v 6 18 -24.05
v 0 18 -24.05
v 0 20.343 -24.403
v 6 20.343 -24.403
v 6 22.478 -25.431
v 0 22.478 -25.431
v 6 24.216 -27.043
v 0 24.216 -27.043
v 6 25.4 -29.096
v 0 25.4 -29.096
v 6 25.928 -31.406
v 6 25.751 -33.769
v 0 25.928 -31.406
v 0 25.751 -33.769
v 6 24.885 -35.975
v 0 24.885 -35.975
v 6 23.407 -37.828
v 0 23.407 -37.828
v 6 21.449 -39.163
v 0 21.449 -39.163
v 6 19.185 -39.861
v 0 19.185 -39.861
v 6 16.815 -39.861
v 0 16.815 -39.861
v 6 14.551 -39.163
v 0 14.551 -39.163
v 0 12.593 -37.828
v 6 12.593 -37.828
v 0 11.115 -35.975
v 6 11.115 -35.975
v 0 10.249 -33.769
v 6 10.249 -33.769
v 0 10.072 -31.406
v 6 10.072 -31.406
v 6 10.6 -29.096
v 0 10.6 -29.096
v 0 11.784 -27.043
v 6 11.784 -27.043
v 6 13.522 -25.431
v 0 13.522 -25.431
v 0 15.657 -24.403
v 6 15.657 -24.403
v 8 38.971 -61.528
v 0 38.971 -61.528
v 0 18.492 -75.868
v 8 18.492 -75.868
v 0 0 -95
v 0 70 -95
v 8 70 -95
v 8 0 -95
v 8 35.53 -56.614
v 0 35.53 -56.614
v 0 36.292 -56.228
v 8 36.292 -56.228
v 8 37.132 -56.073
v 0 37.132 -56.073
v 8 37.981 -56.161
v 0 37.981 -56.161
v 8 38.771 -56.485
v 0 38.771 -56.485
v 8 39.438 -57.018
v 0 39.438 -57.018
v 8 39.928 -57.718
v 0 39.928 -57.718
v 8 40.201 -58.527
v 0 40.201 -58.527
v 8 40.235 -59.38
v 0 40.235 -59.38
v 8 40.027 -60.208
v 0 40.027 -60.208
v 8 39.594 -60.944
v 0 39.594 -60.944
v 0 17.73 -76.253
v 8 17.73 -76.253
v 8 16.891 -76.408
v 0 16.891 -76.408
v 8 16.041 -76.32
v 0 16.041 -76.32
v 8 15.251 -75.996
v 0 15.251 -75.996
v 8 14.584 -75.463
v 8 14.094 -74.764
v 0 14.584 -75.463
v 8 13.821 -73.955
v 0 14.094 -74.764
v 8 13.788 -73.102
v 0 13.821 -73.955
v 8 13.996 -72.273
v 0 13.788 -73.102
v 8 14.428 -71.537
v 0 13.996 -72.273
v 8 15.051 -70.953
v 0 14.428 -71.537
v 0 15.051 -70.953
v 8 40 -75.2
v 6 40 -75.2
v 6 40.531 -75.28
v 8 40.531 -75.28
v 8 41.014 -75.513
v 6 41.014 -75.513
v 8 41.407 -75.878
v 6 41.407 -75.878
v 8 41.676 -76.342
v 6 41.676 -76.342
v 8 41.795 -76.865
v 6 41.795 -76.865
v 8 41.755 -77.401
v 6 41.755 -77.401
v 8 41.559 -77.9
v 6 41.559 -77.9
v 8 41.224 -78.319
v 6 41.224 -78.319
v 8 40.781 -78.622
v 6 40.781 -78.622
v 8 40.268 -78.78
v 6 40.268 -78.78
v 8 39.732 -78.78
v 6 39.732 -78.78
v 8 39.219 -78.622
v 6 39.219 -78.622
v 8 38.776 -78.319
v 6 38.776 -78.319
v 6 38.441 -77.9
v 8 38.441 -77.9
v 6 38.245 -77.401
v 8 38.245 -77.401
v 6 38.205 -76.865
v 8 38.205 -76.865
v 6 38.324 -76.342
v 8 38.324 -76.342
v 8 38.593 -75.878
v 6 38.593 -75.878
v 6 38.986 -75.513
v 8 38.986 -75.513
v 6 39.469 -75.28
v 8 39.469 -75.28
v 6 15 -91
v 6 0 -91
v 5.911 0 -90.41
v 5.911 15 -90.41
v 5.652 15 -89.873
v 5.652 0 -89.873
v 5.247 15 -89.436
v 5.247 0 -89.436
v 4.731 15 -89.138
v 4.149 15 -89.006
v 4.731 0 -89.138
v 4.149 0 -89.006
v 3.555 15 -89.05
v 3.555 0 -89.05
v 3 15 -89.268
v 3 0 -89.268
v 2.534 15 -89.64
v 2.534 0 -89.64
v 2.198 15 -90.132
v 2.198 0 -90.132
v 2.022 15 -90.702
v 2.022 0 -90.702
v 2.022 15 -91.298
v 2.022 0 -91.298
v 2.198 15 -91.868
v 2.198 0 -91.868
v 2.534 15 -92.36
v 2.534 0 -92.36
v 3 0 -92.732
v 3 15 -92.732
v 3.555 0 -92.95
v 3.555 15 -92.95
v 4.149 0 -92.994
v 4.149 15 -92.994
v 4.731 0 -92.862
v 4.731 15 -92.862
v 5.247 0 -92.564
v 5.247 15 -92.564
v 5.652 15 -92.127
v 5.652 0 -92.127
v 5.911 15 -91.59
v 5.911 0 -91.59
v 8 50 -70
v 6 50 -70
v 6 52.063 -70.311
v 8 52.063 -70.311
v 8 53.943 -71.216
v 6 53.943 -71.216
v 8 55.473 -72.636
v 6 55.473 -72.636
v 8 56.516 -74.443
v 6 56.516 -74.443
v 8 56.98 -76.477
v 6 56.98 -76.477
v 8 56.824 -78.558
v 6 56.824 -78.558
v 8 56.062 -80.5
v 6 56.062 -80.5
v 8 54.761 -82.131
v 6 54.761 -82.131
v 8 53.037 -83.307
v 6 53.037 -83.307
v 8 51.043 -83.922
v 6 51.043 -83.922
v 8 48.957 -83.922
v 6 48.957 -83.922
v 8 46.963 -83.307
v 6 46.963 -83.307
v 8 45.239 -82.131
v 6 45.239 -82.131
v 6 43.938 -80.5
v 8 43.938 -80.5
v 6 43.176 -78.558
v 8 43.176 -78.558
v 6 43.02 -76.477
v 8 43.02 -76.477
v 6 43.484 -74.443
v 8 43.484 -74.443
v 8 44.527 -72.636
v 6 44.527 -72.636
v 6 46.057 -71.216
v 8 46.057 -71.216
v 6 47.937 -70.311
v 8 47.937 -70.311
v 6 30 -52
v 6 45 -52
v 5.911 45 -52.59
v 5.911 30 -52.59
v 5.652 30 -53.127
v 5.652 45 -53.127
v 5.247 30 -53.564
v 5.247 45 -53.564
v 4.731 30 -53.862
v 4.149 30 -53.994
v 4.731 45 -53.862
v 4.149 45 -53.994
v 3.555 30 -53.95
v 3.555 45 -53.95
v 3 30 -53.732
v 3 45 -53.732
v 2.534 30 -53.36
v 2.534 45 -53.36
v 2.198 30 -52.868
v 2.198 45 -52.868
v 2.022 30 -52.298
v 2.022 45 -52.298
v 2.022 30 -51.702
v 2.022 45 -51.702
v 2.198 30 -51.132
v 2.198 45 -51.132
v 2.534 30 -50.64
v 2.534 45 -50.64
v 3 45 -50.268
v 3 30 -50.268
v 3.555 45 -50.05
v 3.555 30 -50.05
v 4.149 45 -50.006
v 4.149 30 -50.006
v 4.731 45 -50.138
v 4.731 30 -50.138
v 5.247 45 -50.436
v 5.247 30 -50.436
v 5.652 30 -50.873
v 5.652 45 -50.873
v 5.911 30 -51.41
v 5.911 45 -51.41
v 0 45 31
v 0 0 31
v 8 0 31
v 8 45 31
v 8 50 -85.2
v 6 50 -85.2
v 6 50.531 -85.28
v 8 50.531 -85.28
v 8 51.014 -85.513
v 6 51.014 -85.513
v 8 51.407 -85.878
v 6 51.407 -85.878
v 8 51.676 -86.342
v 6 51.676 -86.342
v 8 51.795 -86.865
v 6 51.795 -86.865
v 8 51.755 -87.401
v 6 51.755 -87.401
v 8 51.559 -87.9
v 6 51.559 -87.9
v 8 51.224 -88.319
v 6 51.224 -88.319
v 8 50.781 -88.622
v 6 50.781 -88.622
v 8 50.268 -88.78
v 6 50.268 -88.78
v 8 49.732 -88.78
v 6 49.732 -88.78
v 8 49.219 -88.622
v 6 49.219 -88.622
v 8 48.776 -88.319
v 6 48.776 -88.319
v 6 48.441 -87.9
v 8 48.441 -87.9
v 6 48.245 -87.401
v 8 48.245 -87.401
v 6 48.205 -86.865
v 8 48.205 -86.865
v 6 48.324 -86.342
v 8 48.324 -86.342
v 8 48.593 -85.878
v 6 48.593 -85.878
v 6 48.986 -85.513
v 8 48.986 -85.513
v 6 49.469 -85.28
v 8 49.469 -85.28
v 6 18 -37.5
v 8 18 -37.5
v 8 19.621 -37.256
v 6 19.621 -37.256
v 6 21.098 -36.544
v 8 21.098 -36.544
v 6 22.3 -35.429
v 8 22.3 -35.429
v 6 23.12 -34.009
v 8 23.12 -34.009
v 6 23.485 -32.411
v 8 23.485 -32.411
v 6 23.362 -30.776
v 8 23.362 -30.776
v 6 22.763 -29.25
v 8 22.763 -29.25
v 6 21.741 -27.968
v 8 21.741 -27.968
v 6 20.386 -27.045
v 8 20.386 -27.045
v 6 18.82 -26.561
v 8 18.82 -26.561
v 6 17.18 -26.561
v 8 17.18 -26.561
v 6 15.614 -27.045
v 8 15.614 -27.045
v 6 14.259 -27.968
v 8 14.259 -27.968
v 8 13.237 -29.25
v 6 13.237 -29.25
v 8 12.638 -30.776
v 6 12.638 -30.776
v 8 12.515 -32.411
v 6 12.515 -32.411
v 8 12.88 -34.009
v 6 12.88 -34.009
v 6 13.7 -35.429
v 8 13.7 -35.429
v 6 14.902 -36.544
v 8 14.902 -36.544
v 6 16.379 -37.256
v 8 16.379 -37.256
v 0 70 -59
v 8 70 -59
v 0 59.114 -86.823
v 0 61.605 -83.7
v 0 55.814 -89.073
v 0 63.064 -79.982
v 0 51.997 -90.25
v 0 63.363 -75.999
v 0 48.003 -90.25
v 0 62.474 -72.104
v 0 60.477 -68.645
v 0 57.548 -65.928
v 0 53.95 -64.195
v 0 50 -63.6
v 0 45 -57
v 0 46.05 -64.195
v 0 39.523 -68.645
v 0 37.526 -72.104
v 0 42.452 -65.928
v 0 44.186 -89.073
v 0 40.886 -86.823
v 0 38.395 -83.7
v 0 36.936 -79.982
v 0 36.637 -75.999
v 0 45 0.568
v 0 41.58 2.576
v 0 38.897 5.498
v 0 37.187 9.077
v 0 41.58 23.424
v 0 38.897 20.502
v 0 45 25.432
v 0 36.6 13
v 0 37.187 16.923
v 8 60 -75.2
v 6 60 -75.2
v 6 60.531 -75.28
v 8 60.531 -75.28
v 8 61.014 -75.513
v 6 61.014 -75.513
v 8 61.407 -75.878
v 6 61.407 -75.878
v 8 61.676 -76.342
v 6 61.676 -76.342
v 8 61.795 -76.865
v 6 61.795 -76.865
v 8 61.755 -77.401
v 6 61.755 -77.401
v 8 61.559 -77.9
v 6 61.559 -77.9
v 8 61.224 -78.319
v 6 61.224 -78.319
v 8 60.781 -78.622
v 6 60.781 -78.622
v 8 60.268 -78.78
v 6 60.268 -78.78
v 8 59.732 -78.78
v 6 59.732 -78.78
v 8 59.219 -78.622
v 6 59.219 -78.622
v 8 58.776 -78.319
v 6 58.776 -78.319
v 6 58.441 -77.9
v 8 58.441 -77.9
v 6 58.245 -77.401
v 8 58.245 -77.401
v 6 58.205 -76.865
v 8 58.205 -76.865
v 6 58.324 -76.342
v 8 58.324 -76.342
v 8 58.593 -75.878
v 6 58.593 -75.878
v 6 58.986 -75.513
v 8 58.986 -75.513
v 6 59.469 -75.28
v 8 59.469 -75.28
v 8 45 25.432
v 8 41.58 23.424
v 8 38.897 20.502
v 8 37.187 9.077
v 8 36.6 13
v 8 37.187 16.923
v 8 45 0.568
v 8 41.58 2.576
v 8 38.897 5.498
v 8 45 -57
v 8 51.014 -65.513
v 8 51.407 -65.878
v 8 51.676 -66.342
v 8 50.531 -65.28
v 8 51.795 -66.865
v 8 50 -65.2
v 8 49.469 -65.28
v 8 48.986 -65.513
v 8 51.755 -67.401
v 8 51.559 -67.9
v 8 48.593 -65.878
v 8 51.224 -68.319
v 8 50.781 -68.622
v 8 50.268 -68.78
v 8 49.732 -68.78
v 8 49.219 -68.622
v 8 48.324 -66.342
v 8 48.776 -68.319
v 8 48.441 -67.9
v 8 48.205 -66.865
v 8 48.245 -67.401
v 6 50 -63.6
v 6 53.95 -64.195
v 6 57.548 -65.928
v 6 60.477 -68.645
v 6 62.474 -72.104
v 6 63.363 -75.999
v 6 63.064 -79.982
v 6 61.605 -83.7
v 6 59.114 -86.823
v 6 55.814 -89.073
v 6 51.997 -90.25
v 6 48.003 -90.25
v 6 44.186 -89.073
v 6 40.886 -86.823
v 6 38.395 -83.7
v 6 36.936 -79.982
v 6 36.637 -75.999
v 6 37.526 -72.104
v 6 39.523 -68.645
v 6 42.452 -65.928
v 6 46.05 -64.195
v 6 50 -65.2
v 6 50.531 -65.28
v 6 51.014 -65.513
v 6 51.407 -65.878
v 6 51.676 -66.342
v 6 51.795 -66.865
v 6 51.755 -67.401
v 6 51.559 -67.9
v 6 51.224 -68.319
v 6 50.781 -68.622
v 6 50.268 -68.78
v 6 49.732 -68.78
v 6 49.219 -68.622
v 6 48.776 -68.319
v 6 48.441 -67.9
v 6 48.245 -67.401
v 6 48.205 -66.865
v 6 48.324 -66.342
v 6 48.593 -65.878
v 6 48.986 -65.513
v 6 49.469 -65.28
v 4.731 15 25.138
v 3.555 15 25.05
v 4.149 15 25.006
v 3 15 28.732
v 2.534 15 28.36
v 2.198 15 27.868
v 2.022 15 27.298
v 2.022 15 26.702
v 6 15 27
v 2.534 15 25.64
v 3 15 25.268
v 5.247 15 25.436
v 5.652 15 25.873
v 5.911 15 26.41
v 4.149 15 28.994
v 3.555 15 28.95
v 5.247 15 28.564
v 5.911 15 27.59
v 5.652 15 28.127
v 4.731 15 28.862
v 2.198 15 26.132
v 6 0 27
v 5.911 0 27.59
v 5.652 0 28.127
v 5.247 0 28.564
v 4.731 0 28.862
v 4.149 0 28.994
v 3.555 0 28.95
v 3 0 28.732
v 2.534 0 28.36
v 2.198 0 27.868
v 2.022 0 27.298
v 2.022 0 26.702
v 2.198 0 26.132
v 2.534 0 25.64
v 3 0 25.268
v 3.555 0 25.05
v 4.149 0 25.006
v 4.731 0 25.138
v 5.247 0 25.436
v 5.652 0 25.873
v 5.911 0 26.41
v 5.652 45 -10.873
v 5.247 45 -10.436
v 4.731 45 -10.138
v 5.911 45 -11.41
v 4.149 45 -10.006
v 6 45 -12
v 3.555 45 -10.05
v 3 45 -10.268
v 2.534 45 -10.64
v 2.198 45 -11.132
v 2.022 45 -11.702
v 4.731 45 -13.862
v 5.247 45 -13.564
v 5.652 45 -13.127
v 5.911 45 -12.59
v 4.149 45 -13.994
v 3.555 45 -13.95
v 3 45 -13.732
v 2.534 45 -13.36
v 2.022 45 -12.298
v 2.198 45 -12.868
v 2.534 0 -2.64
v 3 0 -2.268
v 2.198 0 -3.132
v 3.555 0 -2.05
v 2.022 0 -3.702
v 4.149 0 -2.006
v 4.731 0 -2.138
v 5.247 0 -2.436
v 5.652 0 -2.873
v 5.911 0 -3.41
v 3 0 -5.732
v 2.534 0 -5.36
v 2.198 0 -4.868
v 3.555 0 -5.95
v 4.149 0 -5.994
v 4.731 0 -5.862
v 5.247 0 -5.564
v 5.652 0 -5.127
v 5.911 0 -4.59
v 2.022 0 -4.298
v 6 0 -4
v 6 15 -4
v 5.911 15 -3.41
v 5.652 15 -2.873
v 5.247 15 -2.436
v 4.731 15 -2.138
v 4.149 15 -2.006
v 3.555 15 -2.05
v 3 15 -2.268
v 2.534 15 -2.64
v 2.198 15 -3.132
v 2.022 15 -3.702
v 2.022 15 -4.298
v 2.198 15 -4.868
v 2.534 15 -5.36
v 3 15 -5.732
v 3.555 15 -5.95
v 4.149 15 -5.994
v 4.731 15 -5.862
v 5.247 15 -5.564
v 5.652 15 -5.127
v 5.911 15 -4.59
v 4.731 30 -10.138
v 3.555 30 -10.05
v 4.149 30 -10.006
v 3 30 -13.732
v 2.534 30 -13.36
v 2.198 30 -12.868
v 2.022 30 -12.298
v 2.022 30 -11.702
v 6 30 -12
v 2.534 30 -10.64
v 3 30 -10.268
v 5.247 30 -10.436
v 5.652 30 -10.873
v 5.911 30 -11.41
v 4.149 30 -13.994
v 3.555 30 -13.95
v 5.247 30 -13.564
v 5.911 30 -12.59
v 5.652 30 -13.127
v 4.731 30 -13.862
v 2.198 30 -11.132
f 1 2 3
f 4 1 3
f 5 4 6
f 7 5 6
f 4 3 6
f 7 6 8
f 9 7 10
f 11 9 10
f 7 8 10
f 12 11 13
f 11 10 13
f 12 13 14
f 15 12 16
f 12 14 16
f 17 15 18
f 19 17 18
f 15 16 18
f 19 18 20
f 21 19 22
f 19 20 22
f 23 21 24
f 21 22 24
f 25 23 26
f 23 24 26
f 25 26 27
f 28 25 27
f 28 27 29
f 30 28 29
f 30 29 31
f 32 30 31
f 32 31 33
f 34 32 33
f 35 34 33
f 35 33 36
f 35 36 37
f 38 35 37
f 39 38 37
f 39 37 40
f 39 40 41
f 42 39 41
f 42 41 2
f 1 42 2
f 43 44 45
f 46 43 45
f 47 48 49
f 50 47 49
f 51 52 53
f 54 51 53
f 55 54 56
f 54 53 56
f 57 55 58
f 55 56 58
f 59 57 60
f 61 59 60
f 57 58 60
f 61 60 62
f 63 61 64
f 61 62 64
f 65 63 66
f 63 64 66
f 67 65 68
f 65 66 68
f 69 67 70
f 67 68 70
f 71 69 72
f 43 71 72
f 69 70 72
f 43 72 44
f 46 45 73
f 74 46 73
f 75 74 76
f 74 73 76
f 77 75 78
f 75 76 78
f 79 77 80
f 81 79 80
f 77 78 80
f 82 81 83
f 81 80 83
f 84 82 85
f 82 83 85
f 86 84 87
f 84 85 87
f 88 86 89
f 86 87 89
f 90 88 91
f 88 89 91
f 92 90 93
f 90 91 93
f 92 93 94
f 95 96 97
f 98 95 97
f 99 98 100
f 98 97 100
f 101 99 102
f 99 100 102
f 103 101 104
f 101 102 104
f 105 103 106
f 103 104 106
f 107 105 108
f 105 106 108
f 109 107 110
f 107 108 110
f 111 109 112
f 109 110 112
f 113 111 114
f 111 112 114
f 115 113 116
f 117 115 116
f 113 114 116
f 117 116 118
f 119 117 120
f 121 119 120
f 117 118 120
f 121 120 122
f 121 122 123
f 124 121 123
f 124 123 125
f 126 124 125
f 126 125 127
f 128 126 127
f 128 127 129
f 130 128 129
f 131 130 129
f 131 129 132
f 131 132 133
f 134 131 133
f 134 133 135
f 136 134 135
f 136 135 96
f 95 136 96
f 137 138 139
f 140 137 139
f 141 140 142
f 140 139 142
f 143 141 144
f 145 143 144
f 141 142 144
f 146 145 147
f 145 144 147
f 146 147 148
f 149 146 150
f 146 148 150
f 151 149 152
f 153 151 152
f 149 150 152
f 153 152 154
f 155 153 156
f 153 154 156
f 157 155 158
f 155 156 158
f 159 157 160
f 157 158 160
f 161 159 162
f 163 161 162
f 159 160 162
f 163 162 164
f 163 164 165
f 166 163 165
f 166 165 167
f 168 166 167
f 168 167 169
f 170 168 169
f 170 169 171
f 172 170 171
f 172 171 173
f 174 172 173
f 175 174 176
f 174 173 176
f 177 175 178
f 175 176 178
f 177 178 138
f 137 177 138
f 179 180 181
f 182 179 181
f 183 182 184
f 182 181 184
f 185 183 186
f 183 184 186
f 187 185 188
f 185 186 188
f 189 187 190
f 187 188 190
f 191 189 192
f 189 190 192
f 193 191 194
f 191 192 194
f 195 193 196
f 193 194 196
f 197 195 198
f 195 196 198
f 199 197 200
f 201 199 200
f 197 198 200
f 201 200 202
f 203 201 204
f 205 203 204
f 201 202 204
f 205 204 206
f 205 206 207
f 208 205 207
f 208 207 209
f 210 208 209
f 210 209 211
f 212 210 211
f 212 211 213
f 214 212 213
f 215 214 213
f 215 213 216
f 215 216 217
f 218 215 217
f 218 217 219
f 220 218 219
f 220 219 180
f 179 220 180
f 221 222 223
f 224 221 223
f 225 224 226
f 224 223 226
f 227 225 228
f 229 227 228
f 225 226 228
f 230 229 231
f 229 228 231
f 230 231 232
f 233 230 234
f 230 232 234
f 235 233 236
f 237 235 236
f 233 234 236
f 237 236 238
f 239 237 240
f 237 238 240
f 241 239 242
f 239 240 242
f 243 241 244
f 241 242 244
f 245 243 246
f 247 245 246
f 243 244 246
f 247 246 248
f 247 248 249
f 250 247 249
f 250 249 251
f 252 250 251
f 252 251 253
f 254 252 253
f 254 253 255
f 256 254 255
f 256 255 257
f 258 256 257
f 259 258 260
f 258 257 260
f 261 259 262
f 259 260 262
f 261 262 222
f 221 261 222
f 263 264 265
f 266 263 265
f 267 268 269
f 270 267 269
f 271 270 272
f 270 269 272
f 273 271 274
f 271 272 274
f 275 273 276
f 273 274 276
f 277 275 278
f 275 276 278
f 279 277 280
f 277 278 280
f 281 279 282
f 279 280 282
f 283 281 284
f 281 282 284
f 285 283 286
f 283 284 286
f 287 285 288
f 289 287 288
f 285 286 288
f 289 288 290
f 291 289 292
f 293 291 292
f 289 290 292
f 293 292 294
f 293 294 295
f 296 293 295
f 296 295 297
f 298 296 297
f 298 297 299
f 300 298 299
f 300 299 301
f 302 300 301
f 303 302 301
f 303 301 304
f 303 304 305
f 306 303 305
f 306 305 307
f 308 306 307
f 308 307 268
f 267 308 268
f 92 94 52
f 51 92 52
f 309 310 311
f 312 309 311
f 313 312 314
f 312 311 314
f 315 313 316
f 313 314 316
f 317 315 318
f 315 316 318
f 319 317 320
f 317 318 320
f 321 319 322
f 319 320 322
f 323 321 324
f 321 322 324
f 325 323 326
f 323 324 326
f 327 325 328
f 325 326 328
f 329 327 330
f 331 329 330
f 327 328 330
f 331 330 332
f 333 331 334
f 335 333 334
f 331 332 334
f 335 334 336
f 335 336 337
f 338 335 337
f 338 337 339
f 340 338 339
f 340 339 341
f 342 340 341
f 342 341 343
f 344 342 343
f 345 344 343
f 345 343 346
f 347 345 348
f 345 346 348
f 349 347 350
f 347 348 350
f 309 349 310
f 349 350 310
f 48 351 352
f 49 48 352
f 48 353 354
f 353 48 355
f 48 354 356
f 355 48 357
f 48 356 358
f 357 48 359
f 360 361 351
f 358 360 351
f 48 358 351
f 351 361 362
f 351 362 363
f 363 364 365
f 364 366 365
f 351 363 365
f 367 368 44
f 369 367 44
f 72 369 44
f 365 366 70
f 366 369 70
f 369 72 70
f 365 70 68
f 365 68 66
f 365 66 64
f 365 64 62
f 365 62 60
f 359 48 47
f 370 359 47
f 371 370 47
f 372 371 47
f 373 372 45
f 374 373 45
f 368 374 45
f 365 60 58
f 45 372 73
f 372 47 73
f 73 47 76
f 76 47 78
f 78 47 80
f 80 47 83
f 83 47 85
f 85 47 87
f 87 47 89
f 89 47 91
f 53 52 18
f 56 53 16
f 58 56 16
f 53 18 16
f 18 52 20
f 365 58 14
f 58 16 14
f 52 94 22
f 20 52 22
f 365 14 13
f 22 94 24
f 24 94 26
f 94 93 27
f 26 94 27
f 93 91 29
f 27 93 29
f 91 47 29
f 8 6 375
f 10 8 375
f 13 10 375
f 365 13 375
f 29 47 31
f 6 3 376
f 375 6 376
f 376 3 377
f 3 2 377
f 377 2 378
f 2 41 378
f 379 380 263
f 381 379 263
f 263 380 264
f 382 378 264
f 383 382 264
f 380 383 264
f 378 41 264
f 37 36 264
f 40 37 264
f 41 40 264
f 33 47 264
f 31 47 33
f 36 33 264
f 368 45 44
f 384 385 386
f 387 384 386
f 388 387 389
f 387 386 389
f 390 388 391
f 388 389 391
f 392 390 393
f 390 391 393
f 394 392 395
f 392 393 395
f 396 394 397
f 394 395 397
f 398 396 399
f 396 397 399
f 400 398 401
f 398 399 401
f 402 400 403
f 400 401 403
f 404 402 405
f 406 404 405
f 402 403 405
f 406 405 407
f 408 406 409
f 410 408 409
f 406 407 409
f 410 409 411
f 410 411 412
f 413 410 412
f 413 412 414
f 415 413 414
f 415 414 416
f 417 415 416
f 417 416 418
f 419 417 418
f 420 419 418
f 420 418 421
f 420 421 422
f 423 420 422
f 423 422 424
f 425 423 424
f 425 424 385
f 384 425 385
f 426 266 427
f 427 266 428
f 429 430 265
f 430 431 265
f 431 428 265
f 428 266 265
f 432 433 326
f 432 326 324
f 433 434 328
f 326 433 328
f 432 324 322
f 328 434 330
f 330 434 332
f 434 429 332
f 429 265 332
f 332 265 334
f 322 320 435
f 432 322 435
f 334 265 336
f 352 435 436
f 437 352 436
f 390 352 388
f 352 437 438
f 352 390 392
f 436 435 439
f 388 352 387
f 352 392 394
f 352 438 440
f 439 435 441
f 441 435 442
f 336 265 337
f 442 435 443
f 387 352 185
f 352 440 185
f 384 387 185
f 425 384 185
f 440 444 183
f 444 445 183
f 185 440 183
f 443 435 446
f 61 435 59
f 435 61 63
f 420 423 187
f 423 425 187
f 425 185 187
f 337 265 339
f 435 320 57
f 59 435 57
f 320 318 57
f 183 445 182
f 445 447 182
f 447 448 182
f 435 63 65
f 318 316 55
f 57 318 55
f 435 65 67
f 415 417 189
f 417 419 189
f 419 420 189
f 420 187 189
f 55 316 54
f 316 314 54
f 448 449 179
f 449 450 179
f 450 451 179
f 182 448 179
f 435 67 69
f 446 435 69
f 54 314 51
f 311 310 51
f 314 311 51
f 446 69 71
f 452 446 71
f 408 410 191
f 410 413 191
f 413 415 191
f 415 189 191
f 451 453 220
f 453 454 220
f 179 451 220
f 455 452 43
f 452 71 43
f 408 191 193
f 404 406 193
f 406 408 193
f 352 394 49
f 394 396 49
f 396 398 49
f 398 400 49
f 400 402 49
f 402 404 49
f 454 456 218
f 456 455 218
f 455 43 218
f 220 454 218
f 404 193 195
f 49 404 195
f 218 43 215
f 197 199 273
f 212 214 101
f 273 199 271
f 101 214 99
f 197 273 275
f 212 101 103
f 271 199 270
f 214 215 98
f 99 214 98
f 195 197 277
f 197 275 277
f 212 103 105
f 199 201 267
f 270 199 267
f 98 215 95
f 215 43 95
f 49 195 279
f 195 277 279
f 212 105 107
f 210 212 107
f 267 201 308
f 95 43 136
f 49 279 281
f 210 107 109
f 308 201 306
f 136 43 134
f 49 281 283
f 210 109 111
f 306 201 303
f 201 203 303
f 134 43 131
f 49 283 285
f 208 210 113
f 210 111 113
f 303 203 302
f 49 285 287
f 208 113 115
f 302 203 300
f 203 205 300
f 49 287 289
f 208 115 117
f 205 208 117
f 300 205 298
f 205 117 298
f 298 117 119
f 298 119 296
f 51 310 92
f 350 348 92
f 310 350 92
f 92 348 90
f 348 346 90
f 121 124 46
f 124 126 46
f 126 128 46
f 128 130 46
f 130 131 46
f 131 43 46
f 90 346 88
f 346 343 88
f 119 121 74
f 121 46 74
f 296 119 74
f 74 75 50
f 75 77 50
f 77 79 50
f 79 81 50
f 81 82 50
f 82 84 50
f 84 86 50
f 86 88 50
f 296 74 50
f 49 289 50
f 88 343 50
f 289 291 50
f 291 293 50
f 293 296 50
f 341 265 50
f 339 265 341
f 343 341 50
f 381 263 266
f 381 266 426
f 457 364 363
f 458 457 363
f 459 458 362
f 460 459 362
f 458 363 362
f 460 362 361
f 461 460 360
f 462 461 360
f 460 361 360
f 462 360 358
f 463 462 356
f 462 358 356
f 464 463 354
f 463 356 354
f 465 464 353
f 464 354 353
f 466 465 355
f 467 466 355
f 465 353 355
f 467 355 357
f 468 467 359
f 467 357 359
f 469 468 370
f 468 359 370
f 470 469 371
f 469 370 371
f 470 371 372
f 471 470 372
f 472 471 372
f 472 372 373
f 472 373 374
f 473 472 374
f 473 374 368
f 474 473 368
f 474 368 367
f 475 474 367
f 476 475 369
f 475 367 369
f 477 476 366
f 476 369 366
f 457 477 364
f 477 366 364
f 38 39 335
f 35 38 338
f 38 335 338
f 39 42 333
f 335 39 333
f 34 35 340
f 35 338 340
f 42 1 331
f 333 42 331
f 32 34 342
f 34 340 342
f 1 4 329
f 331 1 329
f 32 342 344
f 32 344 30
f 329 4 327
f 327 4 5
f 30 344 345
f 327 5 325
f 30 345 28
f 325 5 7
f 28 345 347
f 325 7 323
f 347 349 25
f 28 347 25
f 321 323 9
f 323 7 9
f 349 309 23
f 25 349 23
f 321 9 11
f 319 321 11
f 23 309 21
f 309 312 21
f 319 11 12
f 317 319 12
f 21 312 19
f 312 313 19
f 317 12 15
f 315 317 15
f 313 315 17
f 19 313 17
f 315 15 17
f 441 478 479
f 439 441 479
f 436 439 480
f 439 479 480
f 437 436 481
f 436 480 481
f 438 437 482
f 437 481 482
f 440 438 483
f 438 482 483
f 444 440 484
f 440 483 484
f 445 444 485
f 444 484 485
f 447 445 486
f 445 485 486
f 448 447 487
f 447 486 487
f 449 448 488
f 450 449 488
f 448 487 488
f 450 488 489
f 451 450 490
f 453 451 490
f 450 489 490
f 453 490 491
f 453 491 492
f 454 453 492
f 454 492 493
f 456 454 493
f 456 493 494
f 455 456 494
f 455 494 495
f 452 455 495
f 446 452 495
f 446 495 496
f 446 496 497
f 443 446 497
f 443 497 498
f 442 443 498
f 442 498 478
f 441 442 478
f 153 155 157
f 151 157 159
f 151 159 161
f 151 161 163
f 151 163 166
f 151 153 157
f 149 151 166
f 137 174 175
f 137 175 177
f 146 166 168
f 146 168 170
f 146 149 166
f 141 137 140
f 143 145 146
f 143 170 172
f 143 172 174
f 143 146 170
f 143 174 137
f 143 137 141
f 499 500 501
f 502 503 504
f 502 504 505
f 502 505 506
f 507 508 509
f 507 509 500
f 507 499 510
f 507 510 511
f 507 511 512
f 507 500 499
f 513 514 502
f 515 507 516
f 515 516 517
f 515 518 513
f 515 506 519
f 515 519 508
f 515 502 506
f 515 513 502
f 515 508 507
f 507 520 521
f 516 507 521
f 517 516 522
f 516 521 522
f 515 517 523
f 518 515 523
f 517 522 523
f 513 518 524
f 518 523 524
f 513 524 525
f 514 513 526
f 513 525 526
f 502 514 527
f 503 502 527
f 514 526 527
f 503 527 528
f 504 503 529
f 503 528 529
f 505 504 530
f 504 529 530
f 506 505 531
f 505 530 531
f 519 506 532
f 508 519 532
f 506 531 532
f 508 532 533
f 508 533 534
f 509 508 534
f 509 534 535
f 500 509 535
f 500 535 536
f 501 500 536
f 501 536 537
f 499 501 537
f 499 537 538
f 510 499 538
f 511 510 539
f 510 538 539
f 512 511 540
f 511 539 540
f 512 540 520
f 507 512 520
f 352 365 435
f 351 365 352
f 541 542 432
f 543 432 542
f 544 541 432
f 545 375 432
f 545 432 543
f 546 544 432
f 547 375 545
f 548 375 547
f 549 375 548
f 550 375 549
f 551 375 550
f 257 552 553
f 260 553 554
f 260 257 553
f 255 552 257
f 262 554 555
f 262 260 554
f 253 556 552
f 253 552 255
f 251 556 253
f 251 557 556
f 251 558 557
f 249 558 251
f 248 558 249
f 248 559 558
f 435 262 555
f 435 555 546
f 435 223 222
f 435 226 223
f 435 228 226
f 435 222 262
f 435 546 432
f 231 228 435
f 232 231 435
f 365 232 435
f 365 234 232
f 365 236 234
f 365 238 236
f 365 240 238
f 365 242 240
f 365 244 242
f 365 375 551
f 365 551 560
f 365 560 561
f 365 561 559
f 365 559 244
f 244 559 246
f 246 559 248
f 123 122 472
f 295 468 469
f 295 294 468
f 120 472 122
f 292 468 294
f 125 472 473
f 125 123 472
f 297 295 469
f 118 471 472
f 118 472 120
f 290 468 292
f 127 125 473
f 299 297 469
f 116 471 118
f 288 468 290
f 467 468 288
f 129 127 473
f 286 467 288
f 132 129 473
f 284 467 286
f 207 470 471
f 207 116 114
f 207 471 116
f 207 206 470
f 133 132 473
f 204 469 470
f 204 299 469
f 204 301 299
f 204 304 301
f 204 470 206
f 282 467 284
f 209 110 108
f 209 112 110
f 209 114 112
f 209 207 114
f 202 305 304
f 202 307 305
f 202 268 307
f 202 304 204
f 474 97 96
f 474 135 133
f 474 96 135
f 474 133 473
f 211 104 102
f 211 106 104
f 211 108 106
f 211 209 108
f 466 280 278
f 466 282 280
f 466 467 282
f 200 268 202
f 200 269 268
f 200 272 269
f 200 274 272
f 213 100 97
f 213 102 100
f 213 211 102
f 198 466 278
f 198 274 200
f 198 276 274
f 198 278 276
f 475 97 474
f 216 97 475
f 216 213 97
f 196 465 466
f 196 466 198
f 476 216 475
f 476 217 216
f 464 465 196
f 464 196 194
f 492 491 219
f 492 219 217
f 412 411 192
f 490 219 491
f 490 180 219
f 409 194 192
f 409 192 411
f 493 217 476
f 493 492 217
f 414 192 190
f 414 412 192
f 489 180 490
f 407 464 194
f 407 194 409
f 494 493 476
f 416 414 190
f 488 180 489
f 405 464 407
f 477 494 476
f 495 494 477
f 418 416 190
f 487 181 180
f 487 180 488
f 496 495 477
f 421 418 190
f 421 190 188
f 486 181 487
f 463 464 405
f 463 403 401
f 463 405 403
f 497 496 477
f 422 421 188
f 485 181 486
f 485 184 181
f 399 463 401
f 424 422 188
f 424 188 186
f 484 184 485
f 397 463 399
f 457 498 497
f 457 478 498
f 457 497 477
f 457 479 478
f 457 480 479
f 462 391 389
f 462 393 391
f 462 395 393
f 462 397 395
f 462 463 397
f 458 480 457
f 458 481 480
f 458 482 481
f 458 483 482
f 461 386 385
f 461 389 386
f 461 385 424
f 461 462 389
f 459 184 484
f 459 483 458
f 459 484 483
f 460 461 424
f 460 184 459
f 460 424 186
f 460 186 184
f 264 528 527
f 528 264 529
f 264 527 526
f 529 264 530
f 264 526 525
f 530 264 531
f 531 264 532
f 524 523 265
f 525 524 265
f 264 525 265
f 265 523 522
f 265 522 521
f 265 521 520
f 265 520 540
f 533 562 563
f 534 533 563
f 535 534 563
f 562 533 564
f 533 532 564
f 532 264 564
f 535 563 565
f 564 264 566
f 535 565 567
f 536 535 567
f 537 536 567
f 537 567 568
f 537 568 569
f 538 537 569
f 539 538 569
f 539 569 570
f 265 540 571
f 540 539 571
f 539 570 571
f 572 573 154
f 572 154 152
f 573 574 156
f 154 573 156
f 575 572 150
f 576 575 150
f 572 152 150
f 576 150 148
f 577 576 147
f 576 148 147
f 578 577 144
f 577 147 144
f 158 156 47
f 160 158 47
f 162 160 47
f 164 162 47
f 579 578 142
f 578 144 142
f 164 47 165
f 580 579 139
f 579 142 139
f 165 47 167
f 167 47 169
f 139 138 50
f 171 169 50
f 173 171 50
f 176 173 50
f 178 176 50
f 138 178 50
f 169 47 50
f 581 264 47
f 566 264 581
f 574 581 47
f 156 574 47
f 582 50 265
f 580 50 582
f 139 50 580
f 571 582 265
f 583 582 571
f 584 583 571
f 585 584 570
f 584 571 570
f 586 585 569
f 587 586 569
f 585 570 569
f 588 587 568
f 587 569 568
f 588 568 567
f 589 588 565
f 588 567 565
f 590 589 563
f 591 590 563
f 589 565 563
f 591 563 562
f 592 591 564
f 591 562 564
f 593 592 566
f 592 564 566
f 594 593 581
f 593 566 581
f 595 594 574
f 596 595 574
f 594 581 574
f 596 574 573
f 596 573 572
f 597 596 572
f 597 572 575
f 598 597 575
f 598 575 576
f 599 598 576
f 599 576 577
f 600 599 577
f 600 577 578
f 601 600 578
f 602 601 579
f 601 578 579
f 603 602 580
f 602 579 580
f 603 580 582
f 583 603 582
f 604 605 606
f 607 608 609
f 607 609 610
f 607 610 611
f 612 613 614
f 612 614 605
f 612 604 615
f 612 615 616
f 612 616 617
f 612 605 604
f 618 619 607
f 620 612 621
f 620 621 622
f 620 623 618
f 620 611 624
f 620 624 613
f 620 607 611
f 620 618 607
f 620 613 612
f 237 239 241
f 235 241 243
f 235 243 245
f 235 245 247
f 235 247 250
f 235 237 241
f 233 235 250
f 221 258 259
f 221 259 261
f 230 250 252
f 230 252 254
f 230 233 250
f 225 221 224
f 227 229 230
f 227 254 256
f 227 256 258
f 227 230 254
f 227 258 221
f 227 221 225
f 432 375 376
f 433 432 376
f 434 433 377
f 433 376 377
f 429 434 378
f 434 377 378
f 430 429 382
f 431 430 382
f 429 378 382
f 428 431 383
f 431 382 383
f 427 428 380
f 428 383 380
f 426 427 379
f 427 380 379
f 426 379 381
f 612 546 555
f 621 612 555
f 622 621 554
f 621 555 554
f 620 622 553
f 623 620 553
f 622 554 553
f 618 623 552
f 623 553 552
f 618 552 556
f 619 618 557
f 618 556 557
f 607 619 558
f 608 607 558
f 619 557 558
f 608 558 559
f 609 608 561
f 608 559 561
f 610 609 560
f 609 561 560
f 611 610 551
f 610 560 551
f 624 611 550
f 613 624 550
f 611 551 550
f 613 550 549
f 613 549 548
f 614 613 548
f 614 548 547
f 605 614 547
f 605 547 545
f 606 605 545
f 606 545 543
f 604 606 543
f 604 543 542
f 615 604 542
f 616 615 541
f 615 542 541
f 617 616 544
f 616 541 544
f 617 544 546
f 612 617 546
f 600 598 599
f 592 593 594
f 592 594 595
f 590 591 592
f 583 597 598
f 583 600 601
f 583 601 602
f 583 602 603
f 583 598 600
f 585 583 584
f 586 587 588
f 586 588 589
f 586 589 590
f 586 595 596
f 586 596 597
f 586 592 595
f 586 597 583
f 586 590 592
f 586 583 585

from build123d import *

# Parameters (mm, degrees)
ESQUISSE2_W             = 8
ESQUISSE2_H             = 95
ESQUISSE2_H_2           = 31
BOSS_EXTRU_1_DEPTH      = 70
ESQUISSE3_R             = 7.95
ENL_V_MAT_EXTRU_1_DEPTH = 10
ESQUISSE4_R             = 13.4
ENL_V_MAT_EXTRU_2_DEPTH = 6
ESQUISSE6_R             = 1.8
ESQUISSE6_R_2           = 7
ENL_V_MAT_EXTRU_3_DEPTH = 10
ESQUISSE7_R             = 2
ENL_V_MAT_EXTRU_4_DEPTH = 15
ENL_V_MAT_EXTRU_5_DEPTH = 10
ESQUISSE9_R             = 13.4
ENL_V_MAT_EXTRU_6_DEPTH = 10
ESQUISSE10_R            = 13.4
ENL_V_MAT_EXTRU_7_DEPTH = 10
ESQUISSE12_R            = 8.1
ESQUISSE12_R_2          = 5.5
BOSS_EXTRU_3_DEPTH      = 2
ESQUISSE13_R            = 2
ENL_V_MAT_EXTRU_8_DEPTH = 15


with BuildPart() as part:
    # Esquisse2 → Boss.-Extru.1 (new body)
    with BuildSketch(Plane(origin=(0, 0, 0), x_dir=(1, 0, 0), z_dir=(0, 1, 0))):
        with Locations((4, 47.5)):
            Rectangle(ESQUISSE2_W, ESQUISSE2_H)
        with Locations((4, -15.5)):
            Rectangle(ESQUISSE2_W, ESQUISSE2_H_2)
    extrude(amount=BOSS_EXTRU_1_DEPTH)

    # Esquisse3 → Enlèv. mat.-Extru.1 (cut)
    with BuildSketch(Plane.ZY):
        with Locations((-32, 18)):
            Circle(ESQUISSE3_R)
    extrude(amount=-ENL_V_MAT_EXTRU_1_DEPTH, mode=Mode.SUBTRACT)

    # Esquisse4 → Enlèv. mat.-Extru.2 (cut)
    with BuildSketch(Plane.ZY):
        with Locations((-77, 50)):
            Circle(ESQUISSE4_R)
    extrude(amount=-ENL_V_MAT_EXTRU_2_DEPTH, mode=Mode.SUBTRACT)

    # Esquisse6 → Enlèv. mat.-Extru.3 (cut)
    with BuildSketch(Plane.ZY):
        with Locations((-77, 60)):
            Circle(ESQUISSE6_R)
        with Locations((-67, 50)):
            Circle(ESQUISSE6_R)
        with Locations((-77, 40)):
            Circle(ESQUISSE6_R)
        with Locations((-87, 50)):
            Circle(ESQUISSE6_R)
        with Locations((-77, 50)):
            Circle(ESQUISSE6_R_2)
    extrude(amount=-ENL_V_MAT_EXTRU_3_DEPTH, mode=Mode.SUBTRACT)

    # Esquisse7 → Enlèv. mat.-Extru.4 (cut)
    with BuildSketch(Plane.XZ):
        with Locations((4, -91)):
            Circle(ESQUISSE7_R)
        with Locations((4, -4)):
            Circle(ESQUISSE7_R)
        with Locations((4, 27)):
            Circle(ESQUISSE7_R)
    extrude(amount=-ENL_V_MAT_EXTRU_4_DEPTH, mode=Mode.SUBTRACT)

    # Esquisse8 → Enlèv. mat.-Extru.5 (cut)
    with BuildSketch(Plane.ZY):
        with BuildLine():
            Line((-61.528438992, 38.971206009), (-75.867849901, 18.492404902))
            ThreePointArc((-75.867849901, 18.492404902), (-75.131123077, 14.31421946), (-70.952937635, 15.050946284))
            Line((-70.952937635, 15.050946284), (-56.613526727, 35.529747391))
            ThreePointArc((-56.613526727, 35.529747391), (-57.35025355, 39.707932833), (-61.528438992, 38.971206009))
        make_face()
    extrude(amount=-ENL_V_MAT_EXTRU_5_DEPTH, mode=Mode.SUBTRACT)

    # Esquisse9 → Enlèv. mat.-Extru.6 (cut)
    with BuildSketch(Plane.ZY):
        with Locations((13, 50)):
            Circle(ESQUISSE9_R)
    extrude(amount=-ENL_V_MAT_EXTRU_6_DEPTH, mode=Mode.SUBTRACT)

    # Esquisse10 → Enlèv. mat.-Extru.7 (cut)
    with BuildSketch(Plane.ZY):
        with Locations((13, 50)):
            Circle(ESQUISSE10_R)
        Polygon((-57, 45), (-59, 70), (31, 70), (31, 45), align=None)
        with BuildLine():
            ThreePointArc((0.567783786, 45), (13, 36.6), (25.432216214, 45))
            Line((25.432216214, 45), (0.567783786, 45))
        make_face()
        with BuildLine():
            Line((0.567783786, 45), (25.432216214, 45))
            ThreePointArc((25.432216214, 45), (26.155829455, 47.453600313), (26.4, 50))
            ThreePointArc((26.4, 50), (10.453600313, 63.155829455), (0.567783786, 45))
        make_face()
    extrude(amount=-ENL_V_MAT_EXTRU_7_DEPTH, mode=Mode.SUBTRACT)

    # Esquisse12 → Boss.-Extru.3 (add)
    with BuildSketch(Plane(origin=(8, 0, 0), x_dir=(0, 0, -1), z_dir=(1, 0, 0))):
        with Locations((32, 18)):
            Circle(ESQUISSE12_R)
        with Locations((32, 18)):
            Circle(ESQUISSE12_R_2, mode=Mode.SUBTRACT)
    extrude(amount=-BOSS_EXTRU_3_DEPTH)

    # Esquisse13 → Enlèv. mat.-Extru.8 (cut)
    with BuildSketch(Plane(origin=(0, 45, 0), x_dir=(1, 0, 0), z_dir=(0, 1, 0))):
        with Locations((4, 12)):
            Circle(ESQUISSE13_R)
        with Locations((4, 52)):
            Circle(ESQUISSE13_R)
    extrude(amount=-ENL_V_MAT_EXTRU_8_DEPTH, mode=Mode.SUBTRACT)


solid = part.part
